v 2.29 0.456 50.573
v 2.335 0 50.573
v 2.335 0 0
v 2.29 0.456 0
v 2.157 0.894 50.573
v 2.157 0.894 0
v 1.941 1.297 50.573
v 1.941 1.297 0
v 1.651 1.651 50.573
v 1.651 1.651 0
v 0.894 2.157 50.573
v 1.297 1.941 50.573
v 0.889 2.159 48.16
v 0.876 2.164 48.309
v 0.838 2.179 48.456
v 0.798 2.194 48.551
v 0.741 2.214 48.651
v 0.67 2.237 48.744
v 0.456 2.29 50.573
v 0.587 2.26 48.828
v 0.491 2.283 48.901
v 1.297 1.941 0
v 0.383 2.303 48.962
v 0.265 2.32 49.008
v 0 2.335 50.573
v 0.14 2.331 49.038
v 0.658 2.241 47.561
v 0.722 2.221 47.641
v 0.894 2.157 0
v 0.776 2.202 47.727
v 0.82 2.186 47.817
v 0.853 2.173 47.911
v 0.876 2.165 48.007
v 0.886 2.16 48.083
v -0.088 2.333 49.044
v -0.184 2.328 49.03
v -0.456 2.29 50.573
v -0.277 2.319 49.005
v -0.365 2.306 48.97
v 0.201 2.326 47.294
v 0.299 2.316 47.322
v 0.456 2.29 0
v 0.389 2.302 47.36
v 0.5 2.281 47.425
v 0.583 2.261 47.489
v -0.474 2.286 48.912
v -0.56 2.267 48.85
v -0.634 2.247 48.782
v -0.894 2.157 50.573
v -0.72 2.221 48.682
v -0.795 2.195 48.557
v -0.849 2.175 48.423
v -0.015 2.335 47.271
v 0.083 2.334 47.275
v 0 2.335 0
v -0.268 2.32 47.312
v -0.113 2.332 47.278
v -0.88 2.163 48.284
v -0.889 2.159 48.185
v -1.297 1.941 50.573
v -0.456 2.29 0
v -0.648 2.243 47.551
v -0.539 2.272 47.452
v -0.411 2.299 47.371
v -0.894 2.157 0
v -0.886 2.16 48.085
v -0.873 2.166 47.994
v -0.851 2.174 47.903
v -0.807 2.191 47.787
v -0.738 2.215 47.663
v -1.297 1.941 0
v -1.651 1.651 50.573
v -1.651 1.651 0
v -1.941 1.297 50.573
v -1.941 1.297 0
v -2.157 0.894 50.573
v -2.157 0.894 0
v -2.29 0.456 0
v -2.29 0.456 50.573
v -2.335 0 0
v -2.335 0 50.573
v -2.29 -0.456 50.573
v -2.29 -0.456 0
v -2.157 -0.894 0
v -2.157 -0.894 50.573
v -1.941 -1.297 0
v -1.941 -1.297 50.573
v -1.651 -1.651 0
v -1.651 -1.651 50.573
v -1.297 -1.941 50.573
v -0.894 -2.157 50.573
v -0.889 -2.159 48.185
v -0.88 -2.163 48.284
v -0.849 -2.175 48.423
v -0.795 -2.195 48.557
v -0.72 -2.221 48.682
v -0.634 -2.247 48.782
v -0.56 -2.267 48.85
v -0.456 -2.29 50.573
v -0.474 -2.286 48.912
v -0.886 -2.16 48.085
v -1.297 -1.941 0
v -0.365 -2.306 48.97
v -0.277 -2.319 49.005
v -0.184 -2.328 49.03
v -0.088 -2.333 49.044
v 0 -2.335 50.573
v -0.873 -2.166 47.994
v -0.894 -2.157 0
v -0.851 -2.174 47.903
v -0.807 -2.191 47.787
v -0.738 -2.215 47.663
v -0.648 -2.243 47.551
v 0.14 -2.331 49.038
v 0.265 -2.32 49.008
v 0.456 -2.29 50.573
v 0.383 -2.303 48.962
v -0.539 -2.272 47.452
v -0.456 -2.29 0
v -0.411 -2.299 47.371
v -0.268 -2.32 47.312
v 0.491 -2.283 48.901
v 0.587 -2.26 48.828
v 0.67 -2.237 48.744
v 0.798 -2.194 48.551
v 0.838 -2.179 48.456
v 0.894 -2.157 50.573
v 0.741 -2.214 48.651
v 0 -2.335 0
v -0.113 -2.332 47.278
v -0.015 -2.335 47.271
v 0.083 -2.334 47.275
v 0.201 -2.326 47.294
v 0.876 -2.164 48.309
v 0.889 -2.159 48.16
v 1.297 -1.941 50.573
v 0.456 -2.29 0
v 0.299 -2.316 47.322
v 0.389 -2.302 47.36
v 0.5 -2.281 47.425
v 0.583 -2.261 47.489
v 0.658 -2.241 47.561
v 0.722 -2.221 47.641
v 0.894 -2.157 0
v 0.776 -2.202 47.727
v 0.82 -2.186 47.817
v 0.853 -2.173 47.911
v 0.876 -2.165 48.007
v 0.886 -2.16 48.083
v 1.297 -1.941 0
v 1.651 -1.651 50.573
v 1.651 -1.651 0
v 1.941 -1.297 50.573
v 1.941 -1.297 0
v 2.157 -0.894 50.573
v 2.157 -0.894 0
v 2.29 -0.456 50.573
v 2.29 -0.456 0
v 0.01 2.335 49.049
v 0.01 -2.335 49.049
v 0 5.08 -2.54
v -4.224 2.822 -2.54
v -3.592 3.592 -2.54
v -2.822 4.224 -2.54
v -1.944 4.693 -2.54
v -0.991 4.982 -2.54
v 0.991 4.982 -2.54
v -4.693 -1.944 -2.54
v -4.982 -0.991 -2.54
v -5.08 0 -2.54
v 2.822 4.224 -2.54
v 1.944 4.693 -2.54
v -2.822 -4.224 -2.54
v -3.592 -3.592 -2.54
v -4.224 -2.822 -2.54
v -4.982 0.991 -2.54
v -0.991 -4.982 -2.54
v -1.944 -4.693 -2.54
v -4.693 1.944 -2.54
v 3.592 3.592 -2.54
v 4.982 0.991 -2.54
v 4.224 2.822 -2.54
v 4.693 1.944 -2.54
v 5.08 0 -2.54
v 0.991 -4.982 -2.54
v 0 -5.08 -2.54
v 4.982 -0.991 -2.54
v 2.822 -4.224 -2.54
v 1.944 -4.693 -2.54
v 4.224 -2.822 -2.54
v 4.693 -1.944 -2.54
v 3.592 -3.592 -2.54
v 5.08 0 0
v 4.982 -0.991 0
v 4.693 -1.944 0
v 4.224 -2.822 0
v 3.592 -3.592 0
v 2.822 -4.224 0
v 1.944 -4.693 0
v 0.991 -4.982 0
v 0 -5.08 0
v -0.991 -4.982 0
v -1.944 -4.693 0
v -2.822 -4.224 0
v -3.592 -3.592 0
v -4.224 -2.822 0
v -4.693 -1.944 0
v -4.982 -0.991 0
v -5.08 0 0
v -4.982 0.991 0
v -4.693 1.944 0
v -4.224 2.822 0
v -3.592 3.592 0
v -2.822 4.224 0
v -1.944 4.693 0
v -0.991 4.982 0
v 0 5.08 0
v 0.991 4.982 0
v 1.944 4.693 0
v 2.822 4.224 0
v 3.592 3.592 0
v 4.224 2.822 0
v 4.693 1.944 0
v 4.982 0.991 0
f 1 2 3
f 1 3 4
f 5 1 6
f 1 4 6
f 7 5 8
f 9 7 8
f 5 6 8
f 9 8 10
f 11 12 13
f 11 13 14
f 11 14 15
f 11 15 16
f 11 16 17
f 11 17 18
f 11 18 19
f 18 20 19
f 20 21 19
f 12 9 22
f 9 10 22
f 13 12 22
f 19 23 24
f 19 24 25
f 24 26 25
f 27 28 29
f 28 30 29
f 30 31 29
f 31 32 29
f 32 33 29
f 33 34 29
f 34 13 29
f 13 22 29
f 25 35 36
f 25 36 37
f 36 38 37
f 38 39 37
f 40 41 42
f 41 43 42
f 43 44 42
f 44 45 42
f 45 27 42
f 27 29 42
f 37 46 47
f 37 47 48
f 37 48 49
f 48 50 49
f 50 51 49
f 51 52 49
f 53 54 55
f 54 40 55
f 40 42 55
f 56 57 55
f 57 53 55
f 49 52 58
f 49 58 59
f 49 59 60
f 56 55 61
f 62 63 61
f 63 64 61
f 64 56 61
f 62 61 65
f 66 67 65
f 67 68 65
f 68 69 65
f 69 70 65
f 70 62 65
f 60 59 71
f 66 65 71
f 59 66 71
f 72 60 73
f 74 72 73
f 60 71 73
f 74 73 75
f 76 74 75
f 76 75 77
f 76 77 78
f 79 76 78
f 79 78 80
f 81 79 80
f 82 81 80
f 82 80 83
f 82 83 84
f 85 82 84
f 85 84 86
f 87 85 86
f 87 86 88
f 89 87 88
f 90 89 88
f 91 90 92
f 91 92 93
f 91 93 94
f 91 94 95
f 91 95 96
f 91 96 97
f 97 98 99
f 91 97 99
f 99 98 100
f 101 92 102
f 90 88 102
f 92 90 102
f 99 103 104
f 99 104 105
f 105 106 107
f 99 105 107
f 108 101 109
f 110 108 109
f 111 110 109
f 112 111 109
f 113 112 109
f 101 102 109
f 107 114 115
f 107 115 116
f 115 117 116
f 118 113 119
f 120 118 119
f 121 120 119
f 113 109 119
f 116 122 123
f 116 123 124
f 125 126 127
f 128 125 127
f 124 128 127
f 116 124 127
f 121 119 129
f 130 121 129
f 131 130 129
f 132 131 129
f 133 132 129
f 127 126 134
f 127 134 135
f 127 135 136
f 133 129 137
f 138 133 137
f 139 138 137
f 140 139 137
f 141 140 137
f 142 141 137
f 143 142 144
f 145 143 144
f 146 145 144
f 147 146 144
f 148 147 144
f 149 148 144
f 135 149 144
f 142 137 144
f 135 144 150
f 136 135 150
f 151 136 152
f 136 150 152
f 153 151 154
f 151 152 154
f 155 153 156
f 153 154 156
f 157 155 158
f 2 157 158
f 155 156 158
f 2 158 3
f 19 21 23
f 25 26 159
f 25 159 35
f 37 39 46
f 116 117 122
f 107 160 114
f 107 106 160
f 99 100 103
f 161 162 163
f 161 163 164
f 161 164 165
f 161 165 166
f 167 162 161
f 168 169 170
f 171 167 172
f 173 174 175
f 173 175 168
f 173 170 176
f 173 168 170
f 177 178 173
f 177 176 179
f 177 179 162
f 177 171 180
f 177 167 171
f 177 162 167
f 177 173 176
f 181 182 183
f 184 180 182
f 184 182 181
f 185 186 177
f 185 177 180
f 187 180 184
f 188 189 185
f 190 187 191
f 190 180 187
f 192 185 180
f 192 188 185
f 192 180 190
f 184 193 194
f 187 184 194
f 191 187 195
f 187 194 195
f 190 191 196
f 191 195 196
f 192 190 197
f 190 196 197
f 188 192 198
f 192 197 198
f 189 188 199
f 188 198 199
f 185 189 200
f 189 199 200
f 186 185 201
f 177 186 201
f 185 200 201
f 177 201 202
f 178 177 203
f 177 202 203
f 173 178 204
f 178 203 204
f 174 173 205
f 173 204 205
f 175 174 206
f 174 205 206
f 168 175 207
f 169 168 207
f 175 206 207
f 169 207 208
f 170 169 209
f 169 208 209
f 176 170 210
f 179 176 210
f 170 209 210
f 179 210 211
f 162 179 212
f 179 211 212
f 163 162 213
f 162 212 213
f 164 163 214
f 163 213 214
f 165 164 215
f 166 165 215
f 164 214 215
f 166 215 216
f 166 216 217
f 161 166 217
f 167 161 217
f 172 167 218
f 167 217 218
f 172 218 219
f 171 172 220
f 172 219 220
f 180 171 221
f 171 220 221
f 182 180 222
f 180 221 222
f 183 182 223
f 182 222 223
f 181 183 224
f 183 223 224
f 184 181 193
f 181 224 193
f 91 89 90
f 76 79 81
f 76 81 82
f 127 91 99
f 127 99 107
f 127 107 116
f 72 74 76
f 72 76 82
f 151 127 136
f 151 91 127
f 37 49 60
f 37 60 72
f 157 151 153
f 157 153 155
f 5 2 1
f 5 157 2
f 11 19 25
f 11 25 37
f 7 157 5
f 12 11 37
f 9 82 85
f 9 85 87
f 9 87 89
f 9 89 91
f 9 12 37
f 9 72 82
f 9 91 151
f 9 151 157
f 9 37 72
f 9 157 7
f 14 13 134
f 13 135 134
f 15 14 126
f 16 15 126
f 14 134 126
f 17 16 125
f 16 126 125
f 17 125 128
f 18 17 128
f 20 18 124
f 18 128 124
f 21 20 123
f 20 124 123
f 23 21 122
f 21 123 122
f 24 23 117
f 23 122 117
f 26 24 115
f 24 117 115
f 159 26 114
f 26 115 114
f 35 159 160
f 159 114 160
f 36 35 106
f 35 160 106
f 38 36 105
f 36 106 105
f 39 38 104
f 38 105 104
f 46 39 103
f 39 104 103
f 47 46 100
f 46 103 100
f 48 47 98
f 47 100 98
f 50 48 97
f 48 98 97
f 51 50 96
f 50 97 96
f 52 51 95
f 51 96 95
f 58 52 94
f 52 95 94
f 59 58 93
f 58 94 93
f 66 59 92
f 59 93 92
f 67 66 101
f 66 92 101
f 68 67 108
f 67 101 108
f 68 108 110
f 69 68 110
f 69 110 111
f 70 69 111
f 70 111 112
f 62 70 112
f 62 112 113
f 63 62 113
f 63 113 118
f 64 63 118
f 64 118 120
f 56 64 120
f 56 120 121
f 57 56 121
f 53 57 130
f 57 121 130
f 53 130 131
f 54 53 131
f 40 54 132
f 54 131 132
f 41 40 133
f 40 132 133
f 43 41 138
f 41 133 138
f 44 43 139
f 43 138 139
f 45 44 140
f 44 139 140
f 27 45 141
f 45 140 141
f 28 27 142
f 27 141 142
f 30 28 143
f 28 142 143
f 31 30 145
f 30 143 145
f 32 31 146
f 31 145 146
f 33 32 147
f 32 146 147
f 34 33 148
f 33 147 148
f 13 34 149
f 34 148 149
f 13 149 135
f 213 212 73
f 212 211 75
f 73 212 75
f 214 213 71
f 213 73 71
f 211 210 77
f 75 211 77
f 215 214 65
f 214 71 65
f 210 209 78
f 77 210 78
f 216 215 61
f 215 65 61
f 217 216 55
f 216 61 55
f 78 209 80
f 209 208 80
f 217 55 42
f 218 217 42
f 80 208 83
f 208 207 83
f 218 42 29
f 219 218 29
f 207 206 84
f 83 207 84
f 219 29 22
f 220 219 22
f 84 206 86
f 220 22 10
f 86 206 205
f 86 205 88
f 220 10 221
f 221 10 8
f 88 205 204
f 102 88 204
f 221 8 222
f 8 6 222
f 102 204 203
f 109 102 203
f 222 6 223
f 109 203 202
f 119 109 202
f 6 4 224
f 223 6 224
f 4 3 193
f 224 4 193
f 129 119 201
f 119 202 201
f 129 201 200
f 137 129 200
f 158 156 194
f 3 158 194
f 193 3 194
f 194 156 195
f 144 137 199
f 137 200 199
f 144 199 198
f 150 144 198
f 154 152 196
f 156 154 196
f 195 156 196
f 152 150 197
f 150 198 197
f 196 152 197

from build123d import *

# Parameters (mm, degrees)
F0_R     = 2.335
F1_DEPTH = 50.5726954
F2_R     = 5.08
F2_R_2   = 2.335
F3_DEPTH = 2.54
F4_R     = 0.889
F5_DEPTH = 12.7


with BuildPart() as f1:
    # F0 (on Top) → F1 (new body)
    with BuildSketch(Plane.XY):
        Circle(F0_R)
    extrude(amount=F1_DEPTH)

    # F2 (on face) → F3 (join)
    with BuildSketch(Plane(origin=(0, 0, 0), x_dir=(1, 0, 0), z_dir=(0, 0, -1))):
        Circle(F2_R)
        Circle(F2_R_2, mode=Mode.SUBTRACT)
        Circle(F2_R_2)
    extrude(amount=F3_DEPTH)

    # F4 (on Front) → F5 (cut, symmetric)
    with BuildSketch(Plane.XZ):
        with Locations((0, 48.1596954)):
            Circle(F4_R)
    extrude(amount=F5_DEPTH, both=True, mode=Mode.SUBTRACT)


solid = f1.part
